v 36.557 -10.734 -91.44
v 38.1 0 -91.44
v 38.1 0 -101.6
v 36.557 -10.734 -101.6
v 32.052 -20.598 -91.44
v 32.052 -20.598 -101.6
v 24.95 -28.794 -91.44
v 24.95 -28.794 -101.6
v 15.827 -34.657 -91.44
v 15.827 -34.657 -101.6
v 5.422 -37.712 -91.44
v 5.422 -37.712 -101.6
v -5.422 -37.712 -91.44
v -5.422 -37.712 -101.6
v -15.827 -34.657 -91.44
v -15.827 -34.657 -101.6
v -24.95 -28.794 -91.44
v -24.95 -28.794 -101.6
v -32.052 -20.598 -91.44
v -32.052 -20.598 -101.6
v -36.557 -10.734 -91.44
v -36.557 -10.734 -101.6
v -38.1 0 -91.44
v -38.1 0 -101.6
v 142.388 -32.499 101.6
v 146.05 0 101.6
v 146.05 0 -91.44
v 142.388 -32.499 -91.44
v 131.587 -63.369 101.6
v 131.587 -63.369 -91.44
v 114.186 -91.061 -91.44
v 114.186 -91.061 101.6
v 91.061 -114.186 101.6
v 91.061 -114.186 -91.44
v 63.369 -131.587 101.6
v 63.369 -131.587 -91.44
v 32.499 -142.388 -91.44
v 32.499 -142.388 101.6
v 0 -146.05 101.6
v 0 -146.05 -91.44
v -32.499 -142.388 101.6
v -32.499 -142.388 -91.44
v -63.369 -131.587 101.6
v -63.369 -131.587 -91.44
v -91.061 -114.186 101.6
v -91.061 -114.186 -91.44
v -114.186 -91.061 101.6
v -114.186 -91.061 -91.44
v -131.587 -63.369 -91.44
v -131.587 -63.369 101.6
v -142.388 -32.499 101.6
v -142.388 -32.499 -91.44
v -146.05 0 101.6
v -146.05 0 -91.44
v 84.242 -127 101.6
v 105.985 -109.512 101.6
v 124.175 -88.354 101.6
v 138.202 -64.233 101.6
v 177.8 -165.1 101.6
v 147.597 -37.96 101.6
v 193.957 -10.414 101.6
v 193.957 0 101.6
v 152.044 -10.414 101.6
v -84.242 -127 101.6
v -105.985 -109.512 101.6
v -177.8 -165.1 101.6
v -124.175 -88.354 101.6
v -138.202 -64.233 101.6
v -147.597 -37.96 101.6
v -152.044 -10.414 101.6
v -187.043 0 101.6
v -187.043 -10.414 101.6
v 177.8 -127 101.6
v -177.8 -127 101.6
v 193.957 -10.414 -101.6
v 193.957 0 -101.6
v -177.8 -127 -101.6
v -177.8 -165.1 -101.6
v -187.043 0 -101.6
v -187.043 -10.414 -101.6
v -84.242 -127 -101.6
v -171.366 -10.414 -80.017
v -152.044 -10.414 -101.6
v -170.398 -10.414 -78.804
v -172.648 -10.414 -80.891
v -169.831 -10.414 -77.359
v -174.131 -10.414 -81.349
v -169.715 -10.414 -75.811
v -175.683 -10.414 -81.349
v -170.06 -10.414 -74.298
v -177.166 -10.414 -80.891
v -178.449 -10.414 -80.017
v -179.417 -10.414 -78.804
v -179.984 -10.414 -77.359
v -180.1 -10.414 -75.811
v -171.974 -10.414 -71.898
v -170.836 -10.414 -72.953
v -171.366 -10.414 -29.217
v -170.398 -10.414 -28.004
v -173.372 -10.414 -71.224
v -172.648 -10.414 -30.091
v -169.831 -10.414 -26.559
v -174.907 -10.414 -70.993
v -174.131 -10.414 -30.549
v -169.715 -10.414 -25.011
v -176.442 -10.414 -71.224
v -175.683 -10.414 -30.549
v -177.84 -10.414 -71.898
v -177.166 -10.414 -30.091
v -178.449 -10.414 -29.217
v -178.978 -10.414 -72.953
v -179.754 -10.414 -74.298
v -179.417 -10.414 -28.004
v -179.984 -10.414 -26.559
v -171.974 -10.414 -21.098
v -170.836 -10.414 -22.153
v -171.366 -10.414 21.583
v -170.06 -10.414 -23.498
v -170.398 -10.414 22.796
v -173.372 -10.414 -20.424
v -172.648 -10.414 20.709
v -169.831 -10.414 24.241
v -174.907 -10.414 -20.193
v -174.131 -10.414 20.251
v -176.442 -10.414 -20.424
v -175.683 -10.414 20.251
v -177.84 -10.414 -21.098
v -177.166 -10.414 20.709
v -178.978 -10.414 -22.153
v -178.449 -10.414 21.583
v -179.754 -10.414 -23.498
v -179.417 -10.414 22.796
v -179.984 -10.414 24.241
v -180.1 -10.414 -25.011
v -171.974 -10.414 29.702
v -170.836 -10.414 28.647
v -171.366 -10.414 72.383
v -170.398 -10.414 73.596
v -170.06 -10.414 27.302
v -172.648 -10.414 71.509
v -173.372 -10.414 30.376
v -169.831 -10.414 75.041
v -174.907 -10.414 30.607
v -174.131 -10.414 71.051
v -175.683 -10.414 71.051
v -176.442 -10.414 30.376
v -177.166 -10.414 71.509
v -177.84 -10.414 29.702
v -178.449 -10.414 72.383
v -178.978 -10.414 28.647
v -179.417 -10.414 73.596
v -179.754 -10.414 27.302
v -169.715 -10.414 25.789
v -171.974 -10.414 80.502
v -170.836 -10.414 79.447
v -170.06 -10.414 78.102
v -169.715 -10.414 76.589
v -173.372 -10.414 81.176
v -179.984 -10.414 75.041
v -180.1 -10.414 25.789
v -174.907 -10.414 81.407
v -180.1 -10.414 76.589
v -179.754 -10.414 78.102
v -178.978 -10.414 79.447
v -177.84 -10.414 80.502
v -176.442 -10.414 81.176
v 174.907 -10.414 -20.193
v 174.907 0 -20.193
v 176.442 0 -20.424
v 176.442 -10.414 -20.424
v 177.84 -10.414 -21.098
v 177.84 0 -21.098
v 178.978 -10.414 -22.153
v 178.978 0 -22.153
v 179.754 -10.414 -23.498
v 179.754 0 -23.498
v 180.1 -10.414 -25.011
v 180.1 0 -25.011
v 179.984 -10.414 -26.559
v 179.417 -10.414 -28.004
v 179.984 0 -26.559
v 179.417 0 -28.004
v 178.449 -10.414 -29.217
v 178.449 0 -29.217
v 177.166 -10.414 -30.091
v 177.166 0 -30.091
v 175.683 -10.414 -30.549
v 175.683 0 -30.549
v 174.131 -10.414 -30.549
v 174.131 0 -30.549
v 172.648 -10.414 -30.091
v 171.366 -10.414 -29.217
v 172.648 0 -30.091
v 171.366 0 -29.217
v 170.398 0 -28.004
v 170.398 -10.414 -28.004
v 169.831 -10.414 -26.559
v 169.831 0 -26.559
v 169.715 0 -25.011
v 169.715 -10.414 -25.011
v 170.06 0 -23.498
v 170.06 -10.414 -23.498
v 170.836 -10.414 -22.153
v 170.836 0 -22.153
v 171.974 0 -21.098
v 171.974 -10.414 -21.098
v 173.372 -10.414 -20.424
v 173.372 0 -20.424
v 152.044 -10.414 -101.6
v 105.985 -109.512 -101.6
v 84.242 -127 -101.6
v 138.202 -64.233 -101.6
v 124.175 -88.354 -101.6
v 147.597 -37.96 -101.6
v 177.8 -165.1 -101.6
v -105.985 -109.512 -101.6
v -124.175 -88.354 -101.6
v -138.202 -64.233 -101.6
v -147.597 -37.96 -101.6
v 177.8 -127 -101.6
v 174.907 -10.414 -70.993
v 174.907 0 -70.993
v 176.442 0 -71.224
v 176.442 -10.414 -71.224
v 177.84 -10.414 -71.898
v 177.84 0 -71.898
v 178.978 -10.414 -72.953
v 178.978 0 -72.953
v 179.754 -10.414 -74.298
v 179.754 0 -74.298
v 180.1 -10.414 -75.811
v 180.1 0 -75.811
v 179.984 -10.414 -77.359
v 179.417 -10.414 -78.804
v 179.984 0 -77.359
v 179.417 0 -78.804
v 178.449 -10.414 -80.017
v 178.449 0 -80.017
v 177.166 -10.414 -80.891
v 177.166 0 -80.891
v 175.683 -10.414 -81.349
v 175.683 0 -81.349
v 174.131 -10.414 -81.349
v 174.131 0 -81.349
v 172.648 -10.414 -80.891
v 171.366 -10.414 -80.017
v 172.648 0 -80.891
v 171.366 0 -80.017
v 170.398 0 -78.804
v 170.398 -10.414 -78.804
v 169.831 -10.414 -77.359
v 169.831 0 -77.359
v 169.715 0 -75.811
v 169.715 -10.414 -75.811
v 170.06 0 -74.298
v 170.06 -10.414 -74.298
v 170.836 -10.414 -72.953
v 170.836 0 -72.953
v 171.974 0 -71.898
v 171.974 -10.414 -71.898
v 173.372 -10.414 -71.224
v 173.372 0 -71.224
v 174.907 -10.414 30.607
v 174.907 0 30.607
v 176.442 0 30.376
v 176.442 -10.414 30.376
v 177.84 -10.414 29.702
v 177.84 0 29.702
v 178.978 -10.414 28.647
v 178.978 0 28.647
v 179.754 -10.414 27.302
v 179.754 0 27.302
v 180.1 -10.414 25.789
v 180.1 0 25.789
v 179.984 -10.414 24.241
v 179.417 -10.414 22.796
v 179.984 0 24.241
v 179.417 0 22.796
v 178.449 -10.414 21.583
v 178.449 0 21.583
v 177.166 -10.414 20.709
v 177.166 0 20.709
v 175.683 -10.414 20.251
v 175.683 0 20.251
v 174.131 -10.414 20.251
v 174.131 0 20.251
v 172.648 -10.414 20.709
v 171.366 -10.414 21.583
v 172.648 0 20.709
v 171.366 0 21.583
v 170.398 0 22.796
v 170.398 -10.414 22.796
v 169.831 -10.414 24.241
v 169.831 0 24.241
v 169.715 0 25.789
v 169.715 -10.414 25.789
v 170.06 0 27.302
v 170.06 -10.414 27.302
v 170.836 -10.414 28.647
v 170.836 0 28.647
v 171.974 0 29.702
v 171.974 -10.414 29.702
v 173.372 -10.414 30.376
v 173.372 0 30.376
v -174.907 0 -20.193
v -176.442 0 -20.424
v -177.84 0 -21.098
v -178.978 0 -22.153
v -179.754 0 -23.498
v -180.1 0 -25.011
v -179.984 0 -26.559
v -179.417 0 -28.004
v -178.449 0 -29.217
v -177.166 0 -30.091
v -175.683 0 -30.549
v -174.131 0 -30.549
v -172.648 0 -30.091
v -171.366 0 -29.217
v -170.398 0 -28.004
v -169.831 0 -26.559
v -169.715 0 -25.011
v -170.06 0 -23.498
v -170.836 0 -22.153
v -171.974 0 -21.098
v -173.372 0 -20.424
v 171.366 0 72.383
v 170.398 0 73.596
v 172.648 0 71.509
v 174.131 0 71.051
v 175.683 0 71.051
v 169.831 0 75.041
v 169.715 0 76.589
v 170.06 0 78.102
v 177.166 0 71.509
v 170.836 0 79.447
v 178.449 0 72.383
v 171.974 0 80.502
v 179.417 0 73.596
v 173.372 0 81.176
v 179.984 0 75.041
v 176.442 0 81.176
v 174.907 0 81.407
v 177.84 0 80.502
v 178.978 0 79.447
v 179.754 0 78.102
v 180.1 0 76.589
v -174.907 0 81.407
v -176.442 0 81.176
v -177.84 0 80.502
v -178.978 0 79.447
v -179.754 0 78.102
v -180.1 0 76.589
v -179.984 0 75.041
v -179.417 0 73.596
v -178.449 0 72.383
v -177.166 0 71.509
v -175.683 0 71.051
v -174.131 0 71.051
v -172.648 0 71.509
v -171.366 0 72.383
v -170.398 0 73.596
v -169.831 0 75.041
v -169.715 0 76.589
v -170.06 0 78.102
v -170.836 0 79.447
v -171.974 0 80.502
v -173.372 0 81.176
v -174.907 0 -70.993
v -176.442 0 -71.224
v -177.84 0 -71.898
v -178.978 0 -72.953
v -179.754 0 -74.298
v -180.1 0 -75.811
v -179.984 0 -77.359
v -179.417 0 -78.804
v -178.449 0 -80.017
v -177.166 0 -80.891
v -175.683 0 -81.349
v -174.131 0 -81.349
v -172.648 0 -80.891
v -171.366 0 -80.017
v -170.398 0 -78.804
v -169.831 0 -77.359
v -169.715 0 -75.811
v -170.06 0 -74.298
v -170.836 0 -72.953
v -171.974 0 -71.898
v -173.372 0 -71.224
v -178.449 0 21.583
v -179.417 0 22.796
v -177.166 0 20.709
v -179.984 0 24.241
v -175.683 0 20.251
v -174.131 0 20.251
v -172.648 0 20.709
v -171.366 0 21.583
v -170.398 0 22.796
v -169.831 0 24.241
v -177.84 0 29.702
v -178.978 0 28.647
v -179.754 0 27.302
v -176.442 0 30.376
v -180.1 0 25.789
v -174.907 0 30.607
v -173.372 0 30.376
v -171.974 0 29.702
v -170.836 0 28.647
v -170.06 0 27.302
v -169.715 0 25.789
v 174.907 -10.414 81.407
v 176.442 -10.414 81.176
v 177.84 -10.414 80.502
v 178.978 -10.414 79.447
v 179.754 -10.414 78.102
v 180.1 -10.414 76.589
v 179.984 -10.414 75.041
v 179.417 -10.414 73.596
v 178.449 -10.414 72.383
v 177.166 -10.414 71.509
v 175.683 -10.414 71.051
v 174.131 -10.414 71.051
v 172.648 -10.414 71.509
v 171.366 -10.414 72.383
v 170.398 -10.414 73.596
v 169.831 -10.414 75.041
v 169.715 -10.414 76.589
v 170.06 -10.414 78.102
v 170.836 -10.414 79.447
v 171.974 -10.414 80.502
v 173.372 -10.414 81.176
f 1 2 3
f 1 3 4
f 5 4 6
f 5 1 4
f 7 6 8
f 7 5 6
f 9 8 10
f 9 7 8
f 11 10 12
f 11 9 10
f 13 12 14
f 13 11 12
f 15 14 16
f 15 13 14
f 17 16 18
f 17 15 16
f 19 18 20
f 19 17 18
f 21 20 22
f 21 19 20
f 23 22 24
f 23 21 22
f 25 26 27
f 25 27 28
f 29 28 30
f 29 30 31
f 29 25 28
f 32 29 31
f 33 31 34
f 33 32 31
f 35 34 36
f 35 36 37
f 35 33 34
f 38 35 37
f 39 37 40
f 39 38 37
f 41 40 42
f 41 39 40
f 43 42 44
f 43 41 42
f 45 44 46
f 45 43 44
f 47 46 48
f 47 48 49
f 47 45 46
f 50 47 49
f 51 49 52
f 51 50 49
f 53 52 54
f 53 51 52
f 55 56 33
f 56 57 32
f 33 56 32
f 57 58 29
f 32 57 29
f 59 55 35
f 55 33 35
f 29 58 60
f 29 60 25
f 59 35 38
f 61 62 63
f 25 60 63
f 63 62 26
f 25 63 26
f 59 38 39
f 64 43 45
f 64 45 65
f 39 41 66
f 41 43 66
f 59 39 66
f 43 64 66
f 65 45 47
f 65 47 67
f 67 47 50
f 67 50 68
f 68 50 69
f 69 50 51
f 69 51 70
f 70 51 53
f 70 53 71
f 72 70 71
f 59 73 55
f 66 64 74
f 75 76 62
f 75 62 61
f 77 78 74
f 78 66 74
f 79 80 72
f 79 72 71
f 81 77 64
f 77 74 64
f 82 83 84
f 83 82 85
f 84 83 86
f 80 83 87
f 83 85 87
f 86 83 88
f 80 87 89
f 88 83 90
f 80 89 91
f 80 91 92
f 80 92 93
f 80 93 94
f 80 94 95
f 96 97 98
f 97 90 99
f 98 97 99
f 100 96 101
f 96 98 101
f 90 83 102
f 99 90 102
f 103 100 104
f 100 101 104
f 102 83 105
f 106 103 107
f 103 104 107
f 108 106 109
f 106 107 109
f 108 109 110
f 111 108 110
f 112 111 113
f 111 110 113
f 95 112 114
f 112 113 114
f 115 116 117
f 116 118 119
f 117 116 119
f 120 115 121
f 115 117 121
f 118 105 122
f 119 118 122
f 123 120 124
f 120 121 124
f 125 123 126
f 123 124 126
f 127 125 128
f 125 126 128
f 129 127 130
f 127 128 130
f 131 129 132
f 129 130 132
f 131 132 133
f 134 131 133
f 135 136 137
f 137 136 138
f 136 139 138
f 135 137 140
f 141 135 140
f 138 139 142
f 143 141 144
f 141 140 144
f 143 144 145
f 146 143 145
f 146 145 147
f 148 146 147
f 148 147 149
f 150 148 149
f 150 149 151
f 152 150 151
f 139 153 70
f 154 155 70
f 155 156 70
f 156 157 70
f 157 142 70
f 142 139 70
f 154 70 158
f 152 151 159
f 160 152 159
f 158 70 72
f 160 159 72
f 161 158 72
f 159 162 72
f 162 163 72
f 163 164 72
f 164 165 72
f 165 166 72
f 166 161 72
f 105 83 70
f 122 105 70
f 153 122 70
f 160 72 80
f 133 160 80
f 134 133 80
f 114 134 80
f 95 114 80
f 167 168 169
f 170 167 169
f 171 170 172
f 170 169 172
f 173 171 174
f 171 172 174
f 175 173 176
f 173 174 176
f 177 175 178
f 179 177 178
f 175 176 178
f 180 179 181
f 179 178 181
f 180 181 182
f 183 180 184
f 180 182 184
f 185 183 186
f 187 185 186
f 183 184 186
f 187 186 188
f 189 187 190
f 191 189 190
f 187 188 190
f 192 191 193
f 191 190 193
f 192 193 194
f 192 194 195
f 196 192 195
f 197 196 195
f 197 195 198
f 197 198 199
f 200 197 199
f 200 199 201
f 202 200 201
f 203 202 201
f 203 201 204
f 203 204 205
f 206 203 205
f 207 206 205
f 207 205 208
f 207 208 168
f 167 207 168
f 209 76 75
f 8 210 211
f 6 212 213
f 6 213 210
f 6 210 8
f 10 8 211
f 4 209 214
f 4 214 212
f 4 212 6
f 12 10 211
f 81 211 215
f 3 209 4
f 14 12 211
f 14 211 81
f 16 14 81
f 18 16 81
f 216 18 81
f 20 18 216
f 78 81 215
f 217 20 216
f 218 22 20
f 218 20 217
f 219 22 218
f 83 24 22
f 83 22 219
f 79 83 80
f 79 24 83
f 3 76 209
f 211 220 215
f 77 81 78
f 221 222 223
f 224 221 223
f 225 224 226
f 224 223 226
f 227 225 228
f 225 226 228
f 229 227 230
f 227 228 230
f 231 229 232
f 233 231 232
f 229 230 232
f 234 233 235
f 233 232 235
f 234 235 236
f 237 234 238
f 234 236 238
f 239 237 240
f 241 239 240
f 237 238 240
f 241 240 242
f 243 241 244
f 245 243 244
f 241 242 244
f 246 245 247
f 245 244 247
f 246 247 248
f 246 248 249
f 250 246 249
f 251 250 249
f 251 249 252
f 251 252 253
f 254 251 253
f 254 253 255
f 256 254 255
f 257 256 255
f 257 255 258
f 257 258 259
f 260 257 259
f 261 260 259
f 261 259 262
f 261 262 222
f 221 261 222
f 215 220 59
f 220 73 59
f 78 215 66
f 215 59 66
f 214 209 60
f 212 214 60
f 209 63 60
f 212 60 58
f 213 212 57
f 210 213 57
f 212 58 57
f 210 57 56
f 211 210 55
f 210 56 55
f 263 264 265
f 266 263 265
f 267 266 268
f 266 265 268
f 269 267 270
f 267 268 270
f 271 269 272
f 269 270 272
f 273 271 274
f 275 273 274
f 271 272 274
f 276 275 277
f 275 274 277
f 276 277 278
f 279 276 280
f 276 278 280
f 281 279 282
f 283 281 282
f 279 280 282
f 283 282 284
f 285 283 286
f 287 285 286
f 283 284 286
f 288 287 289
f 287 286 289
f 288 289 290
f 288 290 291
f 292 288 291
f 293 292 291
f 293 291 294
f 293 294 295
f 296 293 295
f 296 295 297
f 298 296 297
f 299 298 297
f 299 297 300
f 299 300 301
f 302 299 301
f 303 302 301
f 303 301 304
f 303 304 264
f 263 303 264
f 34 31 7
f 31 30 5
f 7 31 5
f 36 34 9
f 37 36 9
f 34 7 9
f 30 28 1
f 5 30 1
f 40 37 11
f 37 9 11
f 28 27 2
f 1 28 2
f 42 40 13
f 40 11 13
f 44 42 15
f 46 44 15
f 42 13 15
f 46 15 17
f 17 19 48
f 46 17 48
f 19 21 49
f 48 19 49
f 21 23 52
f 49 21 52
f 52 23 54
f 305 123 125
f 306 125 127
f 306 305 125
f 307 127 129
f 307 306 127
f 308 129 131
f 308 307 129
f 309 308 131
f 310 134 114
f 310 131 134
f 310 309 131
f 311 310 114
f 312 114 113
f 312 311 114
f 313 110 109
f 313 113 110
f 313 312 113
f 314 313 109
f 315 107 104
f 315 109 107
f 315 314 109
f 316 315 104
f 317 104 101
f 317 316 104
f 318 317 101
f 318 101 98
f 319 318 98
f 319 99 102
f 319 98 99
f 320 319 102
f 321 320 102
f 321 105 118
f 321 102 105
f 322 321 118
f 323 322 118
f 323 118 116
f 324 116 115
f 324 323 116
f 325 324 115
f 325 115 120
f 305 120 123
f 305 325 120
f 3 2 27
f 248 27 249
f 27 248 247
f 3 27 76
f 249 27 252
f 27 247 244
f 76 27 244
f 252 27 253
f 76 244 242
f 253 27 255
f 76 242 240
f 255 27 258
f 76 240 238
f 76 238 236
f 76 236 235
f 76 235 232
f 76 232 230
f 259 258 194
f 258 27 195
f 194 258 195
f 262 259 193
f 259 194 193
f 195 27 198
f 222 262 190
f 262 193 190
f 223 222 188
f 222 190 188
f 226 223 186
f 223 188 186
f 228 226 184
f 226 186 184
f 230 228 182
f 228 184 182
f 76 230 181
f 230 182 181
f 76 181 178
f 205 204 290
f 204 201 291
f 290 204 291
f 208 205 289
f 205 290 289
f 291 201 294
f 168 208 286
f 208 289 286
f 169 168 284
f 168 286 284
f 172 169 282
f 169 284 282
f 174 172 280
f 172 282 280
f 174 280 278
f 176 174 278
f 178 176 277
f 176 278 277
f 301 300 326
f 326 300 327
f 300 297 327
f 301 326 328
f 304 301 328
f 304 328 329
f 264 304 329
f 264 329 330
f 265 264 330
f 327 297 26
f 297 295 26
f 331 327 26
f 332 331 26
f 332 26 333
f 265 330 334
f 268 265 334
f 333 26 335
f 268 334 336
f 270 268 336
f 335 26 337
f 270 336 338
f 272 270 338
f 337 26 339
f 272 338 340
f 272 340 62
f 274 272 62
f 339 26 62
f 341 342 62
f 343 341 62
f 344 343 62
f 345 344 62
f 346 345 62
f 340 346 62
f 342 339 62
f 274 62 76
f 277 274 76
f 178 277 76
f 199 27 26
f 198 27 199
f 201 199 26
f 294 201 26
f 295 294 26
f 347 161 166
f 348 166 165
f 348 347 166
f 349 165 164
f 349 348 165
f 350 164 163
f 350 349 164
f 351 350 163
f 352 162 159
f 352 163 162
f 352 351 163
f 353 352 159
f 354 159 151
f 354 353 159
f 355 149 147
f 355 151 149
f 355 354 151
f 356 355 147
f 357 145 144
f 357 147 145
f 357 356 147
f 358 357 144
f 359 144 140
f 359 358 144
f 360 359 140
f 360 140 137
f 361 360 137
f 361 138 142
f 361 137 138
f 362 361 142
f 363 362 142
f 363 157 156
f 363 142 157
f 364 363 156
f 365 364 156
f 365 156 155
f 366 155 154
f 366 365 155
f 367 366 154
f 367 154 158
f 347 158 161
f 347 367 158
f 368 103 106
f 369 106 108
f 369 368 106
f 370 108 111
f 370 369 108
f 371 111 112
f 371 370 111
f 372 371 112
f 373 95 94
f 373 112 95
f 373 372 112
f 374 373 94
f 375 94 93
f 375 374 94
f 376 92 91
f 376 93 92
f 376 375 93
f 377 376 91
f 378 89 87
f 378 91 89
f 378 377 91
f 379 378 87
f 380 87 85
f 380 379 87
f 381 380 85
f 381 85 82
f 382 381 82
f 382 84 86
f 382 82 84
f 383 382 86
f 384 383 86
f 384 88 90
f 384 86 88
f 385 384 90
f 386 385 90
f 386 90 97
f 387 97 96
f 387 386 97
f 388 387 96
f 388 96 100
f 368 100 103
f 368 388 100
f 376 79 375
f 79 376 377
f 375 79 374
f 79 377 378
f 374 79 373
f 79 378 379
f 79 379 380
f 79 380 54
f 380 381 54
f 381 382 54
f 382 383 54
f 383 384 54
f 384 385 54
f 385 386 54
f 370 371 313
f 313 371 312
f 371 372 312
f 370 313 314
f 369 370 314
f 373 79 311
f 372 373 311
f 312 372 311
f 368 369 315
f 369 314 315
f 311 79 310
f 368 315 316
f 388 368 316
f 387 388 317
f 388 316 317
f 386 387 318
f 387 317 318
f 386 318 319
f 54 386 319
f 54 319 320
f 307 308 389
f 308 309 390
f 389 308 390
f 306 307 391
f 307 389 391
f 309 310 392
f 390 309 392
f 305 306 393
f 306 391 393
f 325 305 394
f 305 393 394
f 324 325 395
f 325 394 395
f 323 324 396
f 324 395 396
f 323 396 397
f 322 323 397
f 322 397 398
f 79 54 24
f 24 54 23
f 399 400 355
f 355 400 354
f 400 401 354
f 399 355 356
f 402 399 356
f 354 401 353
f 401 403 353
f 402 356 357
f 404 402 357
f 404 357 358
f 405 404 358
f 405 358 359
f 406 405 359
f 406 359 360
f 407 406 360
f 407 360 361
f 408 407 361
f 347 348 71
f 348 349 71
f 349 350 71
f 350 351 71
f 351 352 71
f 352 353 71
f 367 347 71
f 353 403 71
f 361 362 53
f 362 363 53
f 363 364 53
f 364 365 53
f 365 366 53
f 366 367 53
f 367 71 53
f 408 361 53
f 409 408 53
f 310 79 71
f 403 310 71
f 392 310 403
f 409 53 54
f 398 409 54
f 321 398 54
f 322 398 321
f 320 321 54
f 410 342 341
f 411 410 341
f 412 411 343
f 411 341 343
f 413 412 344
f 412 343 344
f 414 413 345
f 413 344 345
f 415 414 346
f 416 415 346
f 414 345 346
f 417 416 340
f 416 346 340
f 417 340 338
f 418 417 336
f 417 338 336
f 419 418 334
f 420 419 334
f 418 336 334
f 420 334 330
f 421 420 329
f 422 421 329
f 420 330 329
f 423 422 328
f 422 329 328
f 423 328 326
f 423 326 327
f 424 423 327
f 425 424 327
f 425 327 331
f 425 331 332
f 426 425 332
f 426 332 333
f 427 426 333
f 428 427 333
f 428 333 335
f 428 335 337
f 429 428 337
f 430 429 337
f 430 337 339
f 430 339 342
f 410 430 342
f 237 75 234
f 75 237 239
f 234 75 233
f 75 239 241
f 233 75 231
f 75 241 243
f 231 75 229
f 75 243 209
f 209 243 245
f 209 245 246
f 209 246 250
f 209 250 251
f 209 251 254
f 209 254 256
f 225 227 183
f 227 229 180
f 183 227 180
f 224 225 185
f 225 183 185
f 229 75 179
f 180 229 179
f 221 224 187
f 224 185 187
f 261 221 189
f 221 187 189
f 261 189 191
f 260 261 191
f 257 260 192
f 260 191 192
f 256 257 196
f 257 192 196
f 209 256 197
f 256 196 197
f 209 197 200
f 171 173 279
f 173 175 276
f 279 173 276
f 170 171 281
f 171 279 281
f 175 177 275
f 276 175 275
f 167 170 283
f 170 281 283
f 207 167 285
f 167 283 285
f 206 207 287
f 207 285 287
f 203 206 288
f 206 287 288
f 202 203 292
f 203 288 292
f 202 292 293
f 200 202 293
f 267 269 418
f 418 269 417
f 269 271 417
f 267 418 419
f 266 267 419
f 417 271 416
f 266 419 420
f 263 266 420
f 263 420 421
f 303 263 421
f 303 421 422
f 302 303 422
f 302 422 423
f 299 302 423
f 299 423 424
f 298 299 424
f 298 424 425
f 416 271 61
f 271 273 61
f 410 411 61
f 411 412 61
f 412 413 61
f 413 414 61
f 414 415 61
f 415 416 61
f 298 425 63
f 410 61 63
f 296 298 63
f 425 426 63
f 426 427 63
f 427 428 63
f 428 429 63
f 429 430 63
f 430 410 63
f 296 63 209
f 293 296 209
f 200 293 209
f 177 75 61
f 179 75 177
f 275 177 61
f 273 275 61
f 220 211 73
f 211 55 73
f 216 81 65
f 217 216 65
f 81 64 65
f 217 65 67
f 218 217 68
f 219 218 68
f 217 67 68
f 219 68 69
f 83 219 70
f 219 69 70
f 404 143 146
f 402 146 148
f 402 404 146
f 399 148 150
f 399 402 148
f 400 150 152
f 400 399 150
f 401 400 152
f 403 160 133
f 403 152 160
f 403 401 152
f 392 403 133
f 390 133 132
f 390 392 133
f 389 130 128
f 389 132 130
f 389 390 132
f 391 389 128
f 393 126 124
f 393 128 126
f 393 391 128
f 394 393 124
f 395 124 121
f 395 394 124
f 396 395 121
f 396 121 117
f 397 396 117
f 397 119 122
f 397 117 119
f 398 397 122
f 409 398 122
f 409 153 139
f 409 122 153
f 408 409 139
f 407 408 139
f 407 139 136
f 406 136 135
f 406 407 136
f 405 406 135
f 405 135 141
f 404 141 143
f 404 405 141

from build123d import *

# Parameters (mm, degrees)
BOSS_EXTRUDE1_DEPTH = 101.6
CUT_EXTRUDE1_DEPTH  = 193.04
CUT_EXTRUDE2_DEPTH  = 320.596404315
SKETCH5_R           = 5.207
CUT_EXTRUDE4_DEPTH  = 82.042


with BuildPart() as part:
    # Sketch2 → Boss-Extrude1 (new, symmetric)
    with BuildSketch(Plane.XY):
        with BuildLine():
            Line((-187.042762313, 0), (193.957237687, 0))
            Line((193.957237687, 0), (193.957237687, -10.414))
            Line((193.957237687, -10.414), (152.043772, -10.414))
            ThreePointArc((152.043772, -10.414), (131.741592603, -76.615356022), (84.242269675, -127))
            Line((84.242269675, -127), (177.8, -127))
            Line((177.8, -127), (177.8, -165.1))
            Line((177.8, -165.1), (-177.8, -165.1))
            Line((-177.8, -165.1), (-177.8, -127))
            Line((-177.8, -127), (-84.242269675, -127))
            ThreePointArc((-84.242269675, -127), (-131.741592603, -76.615356022), (-152.043772, -10.414))
            Line((-152.043772, -10.414), (-187.042762313, -10.414))
            Line((-187.042762313, -10.414), (-187.042762313, 0))
        make_face()
    extrude(amount=BOSS_EXTRUDE1_DEPTH, both=True)

    # Sketch3 → Cut-Extrude1 (cut)
    with BuildSketch(Plane.XY.offset(101.6)):
        with BuildLine():
            Line((-146.05, 0), (146.05, 0))
            ThreePointArc((146.05, 0), (0, -146.05), (-146.05, 0))
        make_face()
    extrude(amount=-CUT_EXTRUDE1_DEPTH, mode=Mode.SUBTRACT)

    # Sketch4 → Cut-Extrude2 (cut, through all)
    with BuildSketch(Plane.XY.offset(-91.44)):
        with BuildLine():
            Line((-38.1, 0), (38.1, 0))
            ThreePointArc((38.1, 0), (0, -38.1), (-38.1, 0))
        make_face()
    extrude(amount=-CUT_EXTRUDE2_DEPTH, mode=Mode.SUBTRACT)

    # Sketch5 → Cut-Extrude4 (cut)
    with BuildSketch(Plane(origin=(0, 0, 0), x_dir=(1, 0, 0), z_dir=(0, 1, 0))):
        with Locations(Location((174.907237687, -76.2, 0), (0, 0, 270))):
            Circle(SKETCH5_R)
        with Locations(Location((174.907237687, -25.4, 0), (0, 0, 270))):
            Circle(SKETCH5_R)
        with Locations(Location((174.907237687, 25.4, 0), (0, 0, 270))):
            Circle(SKETCH5_R)
        with Locations(Location((174.907237687, 76.2, 0), (0, 0, 270))):
            Circle(SKETCH5_R)
    cut_extrude4 = extrude(amount=-CUT_EXTRUDE4_DEPTH, mode=Mode.SUBTRACT)

    # Mirror1: Cut-Extrude4 across plane
    add(cut_extrude4.mirror(Plane(origin=(0, 0, 0), x_dir=(0, 0, 1), z_dir=(1, 0, 0))), mode=Mode.SUBTRACT)


solid = part.part
